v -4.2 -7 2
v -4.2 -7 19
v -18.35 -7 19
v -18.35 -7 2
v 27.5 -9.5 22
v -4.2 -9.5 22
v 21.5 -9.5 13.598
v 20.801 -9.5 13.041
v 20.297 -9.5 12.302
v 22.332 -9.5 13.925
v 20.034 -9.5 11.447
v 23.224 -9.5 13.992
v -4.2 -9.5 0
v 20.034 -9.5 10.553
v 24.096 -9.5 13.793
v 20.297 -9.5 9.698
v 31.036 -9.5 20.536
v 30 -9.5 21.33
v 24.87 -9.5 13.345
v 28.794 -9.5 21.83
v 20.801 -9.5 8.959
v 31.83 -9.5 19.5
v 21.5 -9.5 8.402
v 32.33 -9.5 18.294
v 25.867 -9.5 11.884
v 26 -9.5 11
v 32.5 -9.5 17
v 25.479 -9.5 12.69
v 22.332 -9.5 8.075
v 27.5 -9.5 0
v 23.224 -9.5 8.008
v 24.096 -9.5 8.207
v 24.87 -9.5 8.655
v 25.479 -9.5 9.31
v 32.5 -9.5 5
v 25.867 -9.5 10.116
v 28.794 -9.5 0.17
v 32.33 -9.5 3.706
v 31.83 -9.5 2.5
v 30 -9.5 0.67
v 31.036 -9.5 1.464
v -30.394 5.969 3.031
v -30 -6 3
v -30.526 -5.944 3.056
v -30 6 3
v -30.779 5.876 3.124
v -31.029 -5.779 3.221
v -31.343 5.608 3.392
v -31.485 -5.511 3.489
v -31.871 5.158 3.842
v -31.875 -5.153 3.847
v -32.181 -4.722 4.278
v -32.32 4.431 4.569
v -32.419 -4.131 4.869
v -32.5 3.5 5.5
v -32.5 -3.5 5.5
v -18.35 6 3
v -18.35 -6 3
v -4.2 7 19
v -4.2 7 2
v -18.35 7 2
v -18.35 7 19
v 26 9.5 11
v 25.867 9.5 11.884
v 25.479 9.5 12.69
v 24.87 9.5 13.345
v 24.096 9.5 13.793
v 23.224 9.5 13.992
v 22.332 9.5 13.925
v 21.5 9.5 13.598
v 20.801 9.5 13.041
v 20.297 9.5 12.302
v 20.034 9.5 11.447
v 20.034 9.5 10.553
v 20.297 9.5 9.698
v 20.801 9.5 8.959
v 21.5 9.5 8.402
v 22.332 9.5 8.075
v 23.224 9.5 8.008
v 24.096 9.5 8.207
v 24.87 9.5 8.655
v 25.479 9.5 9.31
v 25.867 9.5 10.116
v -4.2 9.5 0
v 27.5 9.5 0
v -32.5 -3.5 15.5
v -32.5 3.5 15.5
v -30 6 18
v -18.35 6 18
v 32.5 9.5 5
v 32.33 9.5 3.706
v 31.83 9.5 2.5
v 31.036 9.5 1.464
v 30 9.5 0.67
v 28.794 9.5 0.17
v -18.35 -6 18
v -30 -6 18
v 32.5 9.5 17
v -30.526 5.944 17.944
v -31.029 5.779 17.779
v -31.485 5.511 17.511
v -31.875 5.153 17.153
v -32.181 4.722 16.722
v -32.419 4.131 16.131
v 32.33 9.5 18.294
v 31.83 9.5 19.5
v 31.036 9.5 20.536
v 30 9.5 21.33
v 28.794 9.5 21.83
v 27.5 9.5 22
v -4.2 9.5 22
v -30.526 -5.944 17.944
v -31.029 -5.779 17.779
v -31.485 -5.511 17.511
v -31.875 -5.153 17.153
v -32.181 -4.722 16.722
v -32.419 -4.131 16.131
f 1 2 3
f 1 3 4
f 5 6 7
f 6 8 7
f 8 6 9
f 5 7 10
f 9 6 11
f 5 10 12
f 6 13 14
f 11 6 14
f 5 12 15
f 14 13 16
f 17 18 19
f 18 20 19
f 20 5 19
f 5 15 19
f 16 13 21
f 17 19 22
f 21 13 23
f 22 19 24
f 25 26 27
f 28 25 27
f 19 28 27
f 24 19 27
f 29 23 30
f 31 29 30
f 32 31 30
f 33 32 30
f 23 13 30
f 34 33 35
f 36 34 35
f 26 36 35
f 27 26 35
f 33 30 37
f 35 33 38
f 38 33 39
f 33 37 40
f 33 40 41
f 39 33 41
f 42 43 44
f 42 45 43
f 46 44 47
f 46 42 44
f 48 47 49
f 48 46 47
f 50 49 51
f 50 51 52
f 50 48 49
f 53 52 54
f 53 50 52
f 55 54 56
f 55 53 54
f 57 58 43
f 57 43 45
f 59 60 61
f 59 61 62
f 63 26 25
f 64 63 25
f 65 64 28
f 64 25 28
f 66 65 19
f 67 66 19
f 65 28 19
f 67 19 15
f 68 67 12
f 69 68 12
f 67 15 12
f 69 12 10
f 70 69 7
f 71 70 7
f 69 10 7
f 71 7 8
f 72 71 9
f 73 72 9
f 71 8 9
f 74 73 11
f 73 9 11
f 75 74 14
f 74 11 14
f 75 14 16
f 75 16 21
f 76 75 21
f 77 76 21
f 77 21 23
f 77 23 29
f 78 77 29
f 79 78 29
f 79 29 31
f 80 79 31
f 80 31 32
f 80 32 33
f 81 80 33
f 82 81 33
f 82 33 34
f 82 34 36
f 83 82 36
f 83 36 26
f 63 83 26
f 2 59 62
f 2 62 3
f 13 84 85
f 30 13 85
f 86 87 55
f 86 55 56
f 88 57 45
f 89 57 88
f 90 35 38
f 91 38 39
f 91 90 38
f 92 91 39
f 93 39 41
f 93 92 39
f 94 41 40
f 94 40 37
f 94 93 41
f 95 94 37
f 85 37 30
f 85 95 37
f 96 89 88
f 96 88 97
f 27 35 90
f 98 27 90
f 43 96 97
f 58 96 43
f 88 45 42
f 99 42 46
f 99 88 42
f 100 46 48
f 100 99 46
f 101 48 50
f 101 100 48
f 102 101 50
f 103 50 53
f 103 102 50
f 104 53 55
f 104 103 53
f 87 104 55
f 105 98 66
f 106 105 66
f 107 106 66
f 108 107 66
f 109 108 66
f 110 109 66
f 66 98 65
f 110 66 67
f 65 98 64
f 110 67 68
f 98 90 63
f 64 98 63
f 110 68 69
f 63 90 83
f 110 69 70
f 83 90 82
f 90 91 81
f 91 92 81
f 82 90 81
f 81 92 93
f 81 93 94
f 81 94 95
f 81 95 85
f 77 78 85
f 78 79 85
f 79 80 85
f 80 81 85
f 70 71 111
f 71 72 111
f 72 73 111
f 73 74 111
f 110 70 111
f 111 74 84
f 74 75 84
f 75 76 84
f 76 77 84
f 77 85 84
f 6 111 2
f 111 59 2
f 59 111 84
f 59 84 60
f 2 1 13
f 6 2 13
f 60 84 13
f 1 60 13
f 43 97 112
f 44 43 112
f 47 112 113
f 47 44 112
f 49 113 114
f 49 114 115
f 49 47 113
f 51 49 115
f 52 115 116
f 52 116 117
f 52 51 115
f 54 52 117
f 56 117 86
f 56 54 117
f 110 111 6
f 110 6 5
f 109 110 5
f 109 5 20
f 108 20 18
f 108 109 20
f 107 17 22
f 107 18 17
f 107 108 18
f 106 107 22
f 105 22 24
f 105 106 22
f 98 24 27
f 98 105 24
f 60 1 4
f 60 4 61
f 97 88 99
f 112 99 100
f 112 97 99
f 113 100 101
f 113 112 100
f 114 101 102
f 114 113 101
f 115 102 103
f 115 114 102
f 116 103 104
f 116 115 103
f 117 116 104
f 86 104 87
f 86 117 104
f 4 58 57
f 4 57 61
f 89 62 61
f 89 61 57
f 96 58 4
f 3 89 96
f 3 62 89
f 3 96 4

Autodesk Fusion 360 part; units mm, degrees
sketch "Sketch1" plane through (0, 0, 0) normal (0, 0, 1) x (1, 0, 0) in component "Motor"
  line L0 (32.5, 9.5) -> (-32.5, 9.5)
  line L1 (-32.5, 9.5) -> (-32.5, -9.5)
  line L2 (-32.5, -9.5) -> (32.5, -9.5)
  line L3 (32.5, -9.5) -> (32.5, 9.5)
  line L4 (32.5, 9.5) -> (-32.5, -9.5) construction
  line L5 (-32.5, 9.5) -> (32.5, -9.5) construction
  dimension "d1" = 65
  dimension "d2" = 19
extrude "Extrude1" add sketch "Sketch1" along normal blind 25 in component "Motor"
extrude "Extrude2" cut 1 faces at (-10.8333, -3.1667, 25) along direction (0, 0, -1) blind 3 in component "Motor"
extrude "Extrude3" cut 1 faces at (-32.5, 3.1667, 14.6667) along direction (1, 0, 0) blind 28.3 in component "Motor"
sketch "Sketch2" plane through (-4.2, 0, 0) normal (-1, 0, 0) x (0, -1, 0) in component "Motor"
  line L0 (9.5, 22) -> (-9.5, 22)
  line L1 (-9.5, 22) -> (-9.5, 0)
  line L2 (-9.5, 0) -> (9.5, 0)
  line L3 (9.5, 0) -> (9.5, 22)
  line L4 (-9.5, 22) -> (9.5, 22)
  line L5 (9.5, 22) -> (9.5, 0)
  line L6 (9.5, 0) -> (-9.5, 0)
  line L7 (-9.5, 0) -> (-9.5, 22)
  line L8 (-7, 19) -> (7, 19)
  line L9 (7, 19) -> (7, 2)
  line L10 (7, 2) -> (-7, 2)
  line L11 (-7, 2) -> (-7, 19)
  line L12 (-6, 18) -> (6, 18)
  line L13 (6, 18) -> (6, 3)
  line L14 (6, 3) -> (-6, 3)
  line L15 (-6, 3) -> (-6, 18)
extrude "Extrude4" add sketch "Sketch2" along normal blind 28.3 contours L8 L9 L10 L11 | L12 L13 L14 L15 in component "Motor"
fillet "Fillet1" radius 5 2 edges at (32.5, 0, 22) (32.5, 0, 0) in component "Motor"
extrude "Extrude5" cut 1 faces at (-32.5, 2.3333, 7.6667) along direction (1, 0, 0) blind 14.15 in component "Motor"
extrude "Extrude6" add sketch "Sketch2" along normal blind 28.3 contours L12 L13 L14 L15 in component "Motor"
fillet "Fillet2" radius 2.5 1 faces at (-32.5, 2, 13) in component "Motor"
sketch "Sketch3" plane through (0, -9.5, 0) normal (0, -1, 0) x (1, 0, 0) in component "Motor"
  arc A0 (27.5, 0) -> (32.5, 5) centre (27.5, 5) ccw
  line L0 (32.5, 5) -> (32.5, 17)
  arc A1 (32.5, 17) -> (27.5, 22) centre (27.5, 17) ccw
  line L1 (27.5, 22) -> (-4.2, 22)
  line L2 (-4.2, 22) -> (-4.2, 0)
  line L3 (-4.2, 0) -> (27.5, 0)
  line L4 (-4.2, 22) -> (27.6, 22)
  line L5 (32.6, 17) -> (32.6, 5)
  line L6 (27.6, 0) -> (-4.2, 0)
  line L7 (-4.2, 0) -> (-4.2, 22)
  arc A2 (32.6, 17) -> (27.6, 22) centre (27.6, 17) ccw
  arc A3 (27.6, 0) -> (32.6, 5) centre (27.6, 5) ccw
  circle A4 centre (23, 11) radius 3
  point P0 (32.6, 22)
  dimension "d19" = 36.8
  dimension "d20" = 5
  dimension "d21" = 6
extrude "Extrude7" cut sketch "Sketch3" against normal blind 56 contours A4 in component "Motor"
component "Motor" placed x (1, 0, 0) y (0, 1, 0) z (0, 0, 1) at (0, 0, 0)
equation "d13 = ( -28.3 / 2 ) * 1 mm"
